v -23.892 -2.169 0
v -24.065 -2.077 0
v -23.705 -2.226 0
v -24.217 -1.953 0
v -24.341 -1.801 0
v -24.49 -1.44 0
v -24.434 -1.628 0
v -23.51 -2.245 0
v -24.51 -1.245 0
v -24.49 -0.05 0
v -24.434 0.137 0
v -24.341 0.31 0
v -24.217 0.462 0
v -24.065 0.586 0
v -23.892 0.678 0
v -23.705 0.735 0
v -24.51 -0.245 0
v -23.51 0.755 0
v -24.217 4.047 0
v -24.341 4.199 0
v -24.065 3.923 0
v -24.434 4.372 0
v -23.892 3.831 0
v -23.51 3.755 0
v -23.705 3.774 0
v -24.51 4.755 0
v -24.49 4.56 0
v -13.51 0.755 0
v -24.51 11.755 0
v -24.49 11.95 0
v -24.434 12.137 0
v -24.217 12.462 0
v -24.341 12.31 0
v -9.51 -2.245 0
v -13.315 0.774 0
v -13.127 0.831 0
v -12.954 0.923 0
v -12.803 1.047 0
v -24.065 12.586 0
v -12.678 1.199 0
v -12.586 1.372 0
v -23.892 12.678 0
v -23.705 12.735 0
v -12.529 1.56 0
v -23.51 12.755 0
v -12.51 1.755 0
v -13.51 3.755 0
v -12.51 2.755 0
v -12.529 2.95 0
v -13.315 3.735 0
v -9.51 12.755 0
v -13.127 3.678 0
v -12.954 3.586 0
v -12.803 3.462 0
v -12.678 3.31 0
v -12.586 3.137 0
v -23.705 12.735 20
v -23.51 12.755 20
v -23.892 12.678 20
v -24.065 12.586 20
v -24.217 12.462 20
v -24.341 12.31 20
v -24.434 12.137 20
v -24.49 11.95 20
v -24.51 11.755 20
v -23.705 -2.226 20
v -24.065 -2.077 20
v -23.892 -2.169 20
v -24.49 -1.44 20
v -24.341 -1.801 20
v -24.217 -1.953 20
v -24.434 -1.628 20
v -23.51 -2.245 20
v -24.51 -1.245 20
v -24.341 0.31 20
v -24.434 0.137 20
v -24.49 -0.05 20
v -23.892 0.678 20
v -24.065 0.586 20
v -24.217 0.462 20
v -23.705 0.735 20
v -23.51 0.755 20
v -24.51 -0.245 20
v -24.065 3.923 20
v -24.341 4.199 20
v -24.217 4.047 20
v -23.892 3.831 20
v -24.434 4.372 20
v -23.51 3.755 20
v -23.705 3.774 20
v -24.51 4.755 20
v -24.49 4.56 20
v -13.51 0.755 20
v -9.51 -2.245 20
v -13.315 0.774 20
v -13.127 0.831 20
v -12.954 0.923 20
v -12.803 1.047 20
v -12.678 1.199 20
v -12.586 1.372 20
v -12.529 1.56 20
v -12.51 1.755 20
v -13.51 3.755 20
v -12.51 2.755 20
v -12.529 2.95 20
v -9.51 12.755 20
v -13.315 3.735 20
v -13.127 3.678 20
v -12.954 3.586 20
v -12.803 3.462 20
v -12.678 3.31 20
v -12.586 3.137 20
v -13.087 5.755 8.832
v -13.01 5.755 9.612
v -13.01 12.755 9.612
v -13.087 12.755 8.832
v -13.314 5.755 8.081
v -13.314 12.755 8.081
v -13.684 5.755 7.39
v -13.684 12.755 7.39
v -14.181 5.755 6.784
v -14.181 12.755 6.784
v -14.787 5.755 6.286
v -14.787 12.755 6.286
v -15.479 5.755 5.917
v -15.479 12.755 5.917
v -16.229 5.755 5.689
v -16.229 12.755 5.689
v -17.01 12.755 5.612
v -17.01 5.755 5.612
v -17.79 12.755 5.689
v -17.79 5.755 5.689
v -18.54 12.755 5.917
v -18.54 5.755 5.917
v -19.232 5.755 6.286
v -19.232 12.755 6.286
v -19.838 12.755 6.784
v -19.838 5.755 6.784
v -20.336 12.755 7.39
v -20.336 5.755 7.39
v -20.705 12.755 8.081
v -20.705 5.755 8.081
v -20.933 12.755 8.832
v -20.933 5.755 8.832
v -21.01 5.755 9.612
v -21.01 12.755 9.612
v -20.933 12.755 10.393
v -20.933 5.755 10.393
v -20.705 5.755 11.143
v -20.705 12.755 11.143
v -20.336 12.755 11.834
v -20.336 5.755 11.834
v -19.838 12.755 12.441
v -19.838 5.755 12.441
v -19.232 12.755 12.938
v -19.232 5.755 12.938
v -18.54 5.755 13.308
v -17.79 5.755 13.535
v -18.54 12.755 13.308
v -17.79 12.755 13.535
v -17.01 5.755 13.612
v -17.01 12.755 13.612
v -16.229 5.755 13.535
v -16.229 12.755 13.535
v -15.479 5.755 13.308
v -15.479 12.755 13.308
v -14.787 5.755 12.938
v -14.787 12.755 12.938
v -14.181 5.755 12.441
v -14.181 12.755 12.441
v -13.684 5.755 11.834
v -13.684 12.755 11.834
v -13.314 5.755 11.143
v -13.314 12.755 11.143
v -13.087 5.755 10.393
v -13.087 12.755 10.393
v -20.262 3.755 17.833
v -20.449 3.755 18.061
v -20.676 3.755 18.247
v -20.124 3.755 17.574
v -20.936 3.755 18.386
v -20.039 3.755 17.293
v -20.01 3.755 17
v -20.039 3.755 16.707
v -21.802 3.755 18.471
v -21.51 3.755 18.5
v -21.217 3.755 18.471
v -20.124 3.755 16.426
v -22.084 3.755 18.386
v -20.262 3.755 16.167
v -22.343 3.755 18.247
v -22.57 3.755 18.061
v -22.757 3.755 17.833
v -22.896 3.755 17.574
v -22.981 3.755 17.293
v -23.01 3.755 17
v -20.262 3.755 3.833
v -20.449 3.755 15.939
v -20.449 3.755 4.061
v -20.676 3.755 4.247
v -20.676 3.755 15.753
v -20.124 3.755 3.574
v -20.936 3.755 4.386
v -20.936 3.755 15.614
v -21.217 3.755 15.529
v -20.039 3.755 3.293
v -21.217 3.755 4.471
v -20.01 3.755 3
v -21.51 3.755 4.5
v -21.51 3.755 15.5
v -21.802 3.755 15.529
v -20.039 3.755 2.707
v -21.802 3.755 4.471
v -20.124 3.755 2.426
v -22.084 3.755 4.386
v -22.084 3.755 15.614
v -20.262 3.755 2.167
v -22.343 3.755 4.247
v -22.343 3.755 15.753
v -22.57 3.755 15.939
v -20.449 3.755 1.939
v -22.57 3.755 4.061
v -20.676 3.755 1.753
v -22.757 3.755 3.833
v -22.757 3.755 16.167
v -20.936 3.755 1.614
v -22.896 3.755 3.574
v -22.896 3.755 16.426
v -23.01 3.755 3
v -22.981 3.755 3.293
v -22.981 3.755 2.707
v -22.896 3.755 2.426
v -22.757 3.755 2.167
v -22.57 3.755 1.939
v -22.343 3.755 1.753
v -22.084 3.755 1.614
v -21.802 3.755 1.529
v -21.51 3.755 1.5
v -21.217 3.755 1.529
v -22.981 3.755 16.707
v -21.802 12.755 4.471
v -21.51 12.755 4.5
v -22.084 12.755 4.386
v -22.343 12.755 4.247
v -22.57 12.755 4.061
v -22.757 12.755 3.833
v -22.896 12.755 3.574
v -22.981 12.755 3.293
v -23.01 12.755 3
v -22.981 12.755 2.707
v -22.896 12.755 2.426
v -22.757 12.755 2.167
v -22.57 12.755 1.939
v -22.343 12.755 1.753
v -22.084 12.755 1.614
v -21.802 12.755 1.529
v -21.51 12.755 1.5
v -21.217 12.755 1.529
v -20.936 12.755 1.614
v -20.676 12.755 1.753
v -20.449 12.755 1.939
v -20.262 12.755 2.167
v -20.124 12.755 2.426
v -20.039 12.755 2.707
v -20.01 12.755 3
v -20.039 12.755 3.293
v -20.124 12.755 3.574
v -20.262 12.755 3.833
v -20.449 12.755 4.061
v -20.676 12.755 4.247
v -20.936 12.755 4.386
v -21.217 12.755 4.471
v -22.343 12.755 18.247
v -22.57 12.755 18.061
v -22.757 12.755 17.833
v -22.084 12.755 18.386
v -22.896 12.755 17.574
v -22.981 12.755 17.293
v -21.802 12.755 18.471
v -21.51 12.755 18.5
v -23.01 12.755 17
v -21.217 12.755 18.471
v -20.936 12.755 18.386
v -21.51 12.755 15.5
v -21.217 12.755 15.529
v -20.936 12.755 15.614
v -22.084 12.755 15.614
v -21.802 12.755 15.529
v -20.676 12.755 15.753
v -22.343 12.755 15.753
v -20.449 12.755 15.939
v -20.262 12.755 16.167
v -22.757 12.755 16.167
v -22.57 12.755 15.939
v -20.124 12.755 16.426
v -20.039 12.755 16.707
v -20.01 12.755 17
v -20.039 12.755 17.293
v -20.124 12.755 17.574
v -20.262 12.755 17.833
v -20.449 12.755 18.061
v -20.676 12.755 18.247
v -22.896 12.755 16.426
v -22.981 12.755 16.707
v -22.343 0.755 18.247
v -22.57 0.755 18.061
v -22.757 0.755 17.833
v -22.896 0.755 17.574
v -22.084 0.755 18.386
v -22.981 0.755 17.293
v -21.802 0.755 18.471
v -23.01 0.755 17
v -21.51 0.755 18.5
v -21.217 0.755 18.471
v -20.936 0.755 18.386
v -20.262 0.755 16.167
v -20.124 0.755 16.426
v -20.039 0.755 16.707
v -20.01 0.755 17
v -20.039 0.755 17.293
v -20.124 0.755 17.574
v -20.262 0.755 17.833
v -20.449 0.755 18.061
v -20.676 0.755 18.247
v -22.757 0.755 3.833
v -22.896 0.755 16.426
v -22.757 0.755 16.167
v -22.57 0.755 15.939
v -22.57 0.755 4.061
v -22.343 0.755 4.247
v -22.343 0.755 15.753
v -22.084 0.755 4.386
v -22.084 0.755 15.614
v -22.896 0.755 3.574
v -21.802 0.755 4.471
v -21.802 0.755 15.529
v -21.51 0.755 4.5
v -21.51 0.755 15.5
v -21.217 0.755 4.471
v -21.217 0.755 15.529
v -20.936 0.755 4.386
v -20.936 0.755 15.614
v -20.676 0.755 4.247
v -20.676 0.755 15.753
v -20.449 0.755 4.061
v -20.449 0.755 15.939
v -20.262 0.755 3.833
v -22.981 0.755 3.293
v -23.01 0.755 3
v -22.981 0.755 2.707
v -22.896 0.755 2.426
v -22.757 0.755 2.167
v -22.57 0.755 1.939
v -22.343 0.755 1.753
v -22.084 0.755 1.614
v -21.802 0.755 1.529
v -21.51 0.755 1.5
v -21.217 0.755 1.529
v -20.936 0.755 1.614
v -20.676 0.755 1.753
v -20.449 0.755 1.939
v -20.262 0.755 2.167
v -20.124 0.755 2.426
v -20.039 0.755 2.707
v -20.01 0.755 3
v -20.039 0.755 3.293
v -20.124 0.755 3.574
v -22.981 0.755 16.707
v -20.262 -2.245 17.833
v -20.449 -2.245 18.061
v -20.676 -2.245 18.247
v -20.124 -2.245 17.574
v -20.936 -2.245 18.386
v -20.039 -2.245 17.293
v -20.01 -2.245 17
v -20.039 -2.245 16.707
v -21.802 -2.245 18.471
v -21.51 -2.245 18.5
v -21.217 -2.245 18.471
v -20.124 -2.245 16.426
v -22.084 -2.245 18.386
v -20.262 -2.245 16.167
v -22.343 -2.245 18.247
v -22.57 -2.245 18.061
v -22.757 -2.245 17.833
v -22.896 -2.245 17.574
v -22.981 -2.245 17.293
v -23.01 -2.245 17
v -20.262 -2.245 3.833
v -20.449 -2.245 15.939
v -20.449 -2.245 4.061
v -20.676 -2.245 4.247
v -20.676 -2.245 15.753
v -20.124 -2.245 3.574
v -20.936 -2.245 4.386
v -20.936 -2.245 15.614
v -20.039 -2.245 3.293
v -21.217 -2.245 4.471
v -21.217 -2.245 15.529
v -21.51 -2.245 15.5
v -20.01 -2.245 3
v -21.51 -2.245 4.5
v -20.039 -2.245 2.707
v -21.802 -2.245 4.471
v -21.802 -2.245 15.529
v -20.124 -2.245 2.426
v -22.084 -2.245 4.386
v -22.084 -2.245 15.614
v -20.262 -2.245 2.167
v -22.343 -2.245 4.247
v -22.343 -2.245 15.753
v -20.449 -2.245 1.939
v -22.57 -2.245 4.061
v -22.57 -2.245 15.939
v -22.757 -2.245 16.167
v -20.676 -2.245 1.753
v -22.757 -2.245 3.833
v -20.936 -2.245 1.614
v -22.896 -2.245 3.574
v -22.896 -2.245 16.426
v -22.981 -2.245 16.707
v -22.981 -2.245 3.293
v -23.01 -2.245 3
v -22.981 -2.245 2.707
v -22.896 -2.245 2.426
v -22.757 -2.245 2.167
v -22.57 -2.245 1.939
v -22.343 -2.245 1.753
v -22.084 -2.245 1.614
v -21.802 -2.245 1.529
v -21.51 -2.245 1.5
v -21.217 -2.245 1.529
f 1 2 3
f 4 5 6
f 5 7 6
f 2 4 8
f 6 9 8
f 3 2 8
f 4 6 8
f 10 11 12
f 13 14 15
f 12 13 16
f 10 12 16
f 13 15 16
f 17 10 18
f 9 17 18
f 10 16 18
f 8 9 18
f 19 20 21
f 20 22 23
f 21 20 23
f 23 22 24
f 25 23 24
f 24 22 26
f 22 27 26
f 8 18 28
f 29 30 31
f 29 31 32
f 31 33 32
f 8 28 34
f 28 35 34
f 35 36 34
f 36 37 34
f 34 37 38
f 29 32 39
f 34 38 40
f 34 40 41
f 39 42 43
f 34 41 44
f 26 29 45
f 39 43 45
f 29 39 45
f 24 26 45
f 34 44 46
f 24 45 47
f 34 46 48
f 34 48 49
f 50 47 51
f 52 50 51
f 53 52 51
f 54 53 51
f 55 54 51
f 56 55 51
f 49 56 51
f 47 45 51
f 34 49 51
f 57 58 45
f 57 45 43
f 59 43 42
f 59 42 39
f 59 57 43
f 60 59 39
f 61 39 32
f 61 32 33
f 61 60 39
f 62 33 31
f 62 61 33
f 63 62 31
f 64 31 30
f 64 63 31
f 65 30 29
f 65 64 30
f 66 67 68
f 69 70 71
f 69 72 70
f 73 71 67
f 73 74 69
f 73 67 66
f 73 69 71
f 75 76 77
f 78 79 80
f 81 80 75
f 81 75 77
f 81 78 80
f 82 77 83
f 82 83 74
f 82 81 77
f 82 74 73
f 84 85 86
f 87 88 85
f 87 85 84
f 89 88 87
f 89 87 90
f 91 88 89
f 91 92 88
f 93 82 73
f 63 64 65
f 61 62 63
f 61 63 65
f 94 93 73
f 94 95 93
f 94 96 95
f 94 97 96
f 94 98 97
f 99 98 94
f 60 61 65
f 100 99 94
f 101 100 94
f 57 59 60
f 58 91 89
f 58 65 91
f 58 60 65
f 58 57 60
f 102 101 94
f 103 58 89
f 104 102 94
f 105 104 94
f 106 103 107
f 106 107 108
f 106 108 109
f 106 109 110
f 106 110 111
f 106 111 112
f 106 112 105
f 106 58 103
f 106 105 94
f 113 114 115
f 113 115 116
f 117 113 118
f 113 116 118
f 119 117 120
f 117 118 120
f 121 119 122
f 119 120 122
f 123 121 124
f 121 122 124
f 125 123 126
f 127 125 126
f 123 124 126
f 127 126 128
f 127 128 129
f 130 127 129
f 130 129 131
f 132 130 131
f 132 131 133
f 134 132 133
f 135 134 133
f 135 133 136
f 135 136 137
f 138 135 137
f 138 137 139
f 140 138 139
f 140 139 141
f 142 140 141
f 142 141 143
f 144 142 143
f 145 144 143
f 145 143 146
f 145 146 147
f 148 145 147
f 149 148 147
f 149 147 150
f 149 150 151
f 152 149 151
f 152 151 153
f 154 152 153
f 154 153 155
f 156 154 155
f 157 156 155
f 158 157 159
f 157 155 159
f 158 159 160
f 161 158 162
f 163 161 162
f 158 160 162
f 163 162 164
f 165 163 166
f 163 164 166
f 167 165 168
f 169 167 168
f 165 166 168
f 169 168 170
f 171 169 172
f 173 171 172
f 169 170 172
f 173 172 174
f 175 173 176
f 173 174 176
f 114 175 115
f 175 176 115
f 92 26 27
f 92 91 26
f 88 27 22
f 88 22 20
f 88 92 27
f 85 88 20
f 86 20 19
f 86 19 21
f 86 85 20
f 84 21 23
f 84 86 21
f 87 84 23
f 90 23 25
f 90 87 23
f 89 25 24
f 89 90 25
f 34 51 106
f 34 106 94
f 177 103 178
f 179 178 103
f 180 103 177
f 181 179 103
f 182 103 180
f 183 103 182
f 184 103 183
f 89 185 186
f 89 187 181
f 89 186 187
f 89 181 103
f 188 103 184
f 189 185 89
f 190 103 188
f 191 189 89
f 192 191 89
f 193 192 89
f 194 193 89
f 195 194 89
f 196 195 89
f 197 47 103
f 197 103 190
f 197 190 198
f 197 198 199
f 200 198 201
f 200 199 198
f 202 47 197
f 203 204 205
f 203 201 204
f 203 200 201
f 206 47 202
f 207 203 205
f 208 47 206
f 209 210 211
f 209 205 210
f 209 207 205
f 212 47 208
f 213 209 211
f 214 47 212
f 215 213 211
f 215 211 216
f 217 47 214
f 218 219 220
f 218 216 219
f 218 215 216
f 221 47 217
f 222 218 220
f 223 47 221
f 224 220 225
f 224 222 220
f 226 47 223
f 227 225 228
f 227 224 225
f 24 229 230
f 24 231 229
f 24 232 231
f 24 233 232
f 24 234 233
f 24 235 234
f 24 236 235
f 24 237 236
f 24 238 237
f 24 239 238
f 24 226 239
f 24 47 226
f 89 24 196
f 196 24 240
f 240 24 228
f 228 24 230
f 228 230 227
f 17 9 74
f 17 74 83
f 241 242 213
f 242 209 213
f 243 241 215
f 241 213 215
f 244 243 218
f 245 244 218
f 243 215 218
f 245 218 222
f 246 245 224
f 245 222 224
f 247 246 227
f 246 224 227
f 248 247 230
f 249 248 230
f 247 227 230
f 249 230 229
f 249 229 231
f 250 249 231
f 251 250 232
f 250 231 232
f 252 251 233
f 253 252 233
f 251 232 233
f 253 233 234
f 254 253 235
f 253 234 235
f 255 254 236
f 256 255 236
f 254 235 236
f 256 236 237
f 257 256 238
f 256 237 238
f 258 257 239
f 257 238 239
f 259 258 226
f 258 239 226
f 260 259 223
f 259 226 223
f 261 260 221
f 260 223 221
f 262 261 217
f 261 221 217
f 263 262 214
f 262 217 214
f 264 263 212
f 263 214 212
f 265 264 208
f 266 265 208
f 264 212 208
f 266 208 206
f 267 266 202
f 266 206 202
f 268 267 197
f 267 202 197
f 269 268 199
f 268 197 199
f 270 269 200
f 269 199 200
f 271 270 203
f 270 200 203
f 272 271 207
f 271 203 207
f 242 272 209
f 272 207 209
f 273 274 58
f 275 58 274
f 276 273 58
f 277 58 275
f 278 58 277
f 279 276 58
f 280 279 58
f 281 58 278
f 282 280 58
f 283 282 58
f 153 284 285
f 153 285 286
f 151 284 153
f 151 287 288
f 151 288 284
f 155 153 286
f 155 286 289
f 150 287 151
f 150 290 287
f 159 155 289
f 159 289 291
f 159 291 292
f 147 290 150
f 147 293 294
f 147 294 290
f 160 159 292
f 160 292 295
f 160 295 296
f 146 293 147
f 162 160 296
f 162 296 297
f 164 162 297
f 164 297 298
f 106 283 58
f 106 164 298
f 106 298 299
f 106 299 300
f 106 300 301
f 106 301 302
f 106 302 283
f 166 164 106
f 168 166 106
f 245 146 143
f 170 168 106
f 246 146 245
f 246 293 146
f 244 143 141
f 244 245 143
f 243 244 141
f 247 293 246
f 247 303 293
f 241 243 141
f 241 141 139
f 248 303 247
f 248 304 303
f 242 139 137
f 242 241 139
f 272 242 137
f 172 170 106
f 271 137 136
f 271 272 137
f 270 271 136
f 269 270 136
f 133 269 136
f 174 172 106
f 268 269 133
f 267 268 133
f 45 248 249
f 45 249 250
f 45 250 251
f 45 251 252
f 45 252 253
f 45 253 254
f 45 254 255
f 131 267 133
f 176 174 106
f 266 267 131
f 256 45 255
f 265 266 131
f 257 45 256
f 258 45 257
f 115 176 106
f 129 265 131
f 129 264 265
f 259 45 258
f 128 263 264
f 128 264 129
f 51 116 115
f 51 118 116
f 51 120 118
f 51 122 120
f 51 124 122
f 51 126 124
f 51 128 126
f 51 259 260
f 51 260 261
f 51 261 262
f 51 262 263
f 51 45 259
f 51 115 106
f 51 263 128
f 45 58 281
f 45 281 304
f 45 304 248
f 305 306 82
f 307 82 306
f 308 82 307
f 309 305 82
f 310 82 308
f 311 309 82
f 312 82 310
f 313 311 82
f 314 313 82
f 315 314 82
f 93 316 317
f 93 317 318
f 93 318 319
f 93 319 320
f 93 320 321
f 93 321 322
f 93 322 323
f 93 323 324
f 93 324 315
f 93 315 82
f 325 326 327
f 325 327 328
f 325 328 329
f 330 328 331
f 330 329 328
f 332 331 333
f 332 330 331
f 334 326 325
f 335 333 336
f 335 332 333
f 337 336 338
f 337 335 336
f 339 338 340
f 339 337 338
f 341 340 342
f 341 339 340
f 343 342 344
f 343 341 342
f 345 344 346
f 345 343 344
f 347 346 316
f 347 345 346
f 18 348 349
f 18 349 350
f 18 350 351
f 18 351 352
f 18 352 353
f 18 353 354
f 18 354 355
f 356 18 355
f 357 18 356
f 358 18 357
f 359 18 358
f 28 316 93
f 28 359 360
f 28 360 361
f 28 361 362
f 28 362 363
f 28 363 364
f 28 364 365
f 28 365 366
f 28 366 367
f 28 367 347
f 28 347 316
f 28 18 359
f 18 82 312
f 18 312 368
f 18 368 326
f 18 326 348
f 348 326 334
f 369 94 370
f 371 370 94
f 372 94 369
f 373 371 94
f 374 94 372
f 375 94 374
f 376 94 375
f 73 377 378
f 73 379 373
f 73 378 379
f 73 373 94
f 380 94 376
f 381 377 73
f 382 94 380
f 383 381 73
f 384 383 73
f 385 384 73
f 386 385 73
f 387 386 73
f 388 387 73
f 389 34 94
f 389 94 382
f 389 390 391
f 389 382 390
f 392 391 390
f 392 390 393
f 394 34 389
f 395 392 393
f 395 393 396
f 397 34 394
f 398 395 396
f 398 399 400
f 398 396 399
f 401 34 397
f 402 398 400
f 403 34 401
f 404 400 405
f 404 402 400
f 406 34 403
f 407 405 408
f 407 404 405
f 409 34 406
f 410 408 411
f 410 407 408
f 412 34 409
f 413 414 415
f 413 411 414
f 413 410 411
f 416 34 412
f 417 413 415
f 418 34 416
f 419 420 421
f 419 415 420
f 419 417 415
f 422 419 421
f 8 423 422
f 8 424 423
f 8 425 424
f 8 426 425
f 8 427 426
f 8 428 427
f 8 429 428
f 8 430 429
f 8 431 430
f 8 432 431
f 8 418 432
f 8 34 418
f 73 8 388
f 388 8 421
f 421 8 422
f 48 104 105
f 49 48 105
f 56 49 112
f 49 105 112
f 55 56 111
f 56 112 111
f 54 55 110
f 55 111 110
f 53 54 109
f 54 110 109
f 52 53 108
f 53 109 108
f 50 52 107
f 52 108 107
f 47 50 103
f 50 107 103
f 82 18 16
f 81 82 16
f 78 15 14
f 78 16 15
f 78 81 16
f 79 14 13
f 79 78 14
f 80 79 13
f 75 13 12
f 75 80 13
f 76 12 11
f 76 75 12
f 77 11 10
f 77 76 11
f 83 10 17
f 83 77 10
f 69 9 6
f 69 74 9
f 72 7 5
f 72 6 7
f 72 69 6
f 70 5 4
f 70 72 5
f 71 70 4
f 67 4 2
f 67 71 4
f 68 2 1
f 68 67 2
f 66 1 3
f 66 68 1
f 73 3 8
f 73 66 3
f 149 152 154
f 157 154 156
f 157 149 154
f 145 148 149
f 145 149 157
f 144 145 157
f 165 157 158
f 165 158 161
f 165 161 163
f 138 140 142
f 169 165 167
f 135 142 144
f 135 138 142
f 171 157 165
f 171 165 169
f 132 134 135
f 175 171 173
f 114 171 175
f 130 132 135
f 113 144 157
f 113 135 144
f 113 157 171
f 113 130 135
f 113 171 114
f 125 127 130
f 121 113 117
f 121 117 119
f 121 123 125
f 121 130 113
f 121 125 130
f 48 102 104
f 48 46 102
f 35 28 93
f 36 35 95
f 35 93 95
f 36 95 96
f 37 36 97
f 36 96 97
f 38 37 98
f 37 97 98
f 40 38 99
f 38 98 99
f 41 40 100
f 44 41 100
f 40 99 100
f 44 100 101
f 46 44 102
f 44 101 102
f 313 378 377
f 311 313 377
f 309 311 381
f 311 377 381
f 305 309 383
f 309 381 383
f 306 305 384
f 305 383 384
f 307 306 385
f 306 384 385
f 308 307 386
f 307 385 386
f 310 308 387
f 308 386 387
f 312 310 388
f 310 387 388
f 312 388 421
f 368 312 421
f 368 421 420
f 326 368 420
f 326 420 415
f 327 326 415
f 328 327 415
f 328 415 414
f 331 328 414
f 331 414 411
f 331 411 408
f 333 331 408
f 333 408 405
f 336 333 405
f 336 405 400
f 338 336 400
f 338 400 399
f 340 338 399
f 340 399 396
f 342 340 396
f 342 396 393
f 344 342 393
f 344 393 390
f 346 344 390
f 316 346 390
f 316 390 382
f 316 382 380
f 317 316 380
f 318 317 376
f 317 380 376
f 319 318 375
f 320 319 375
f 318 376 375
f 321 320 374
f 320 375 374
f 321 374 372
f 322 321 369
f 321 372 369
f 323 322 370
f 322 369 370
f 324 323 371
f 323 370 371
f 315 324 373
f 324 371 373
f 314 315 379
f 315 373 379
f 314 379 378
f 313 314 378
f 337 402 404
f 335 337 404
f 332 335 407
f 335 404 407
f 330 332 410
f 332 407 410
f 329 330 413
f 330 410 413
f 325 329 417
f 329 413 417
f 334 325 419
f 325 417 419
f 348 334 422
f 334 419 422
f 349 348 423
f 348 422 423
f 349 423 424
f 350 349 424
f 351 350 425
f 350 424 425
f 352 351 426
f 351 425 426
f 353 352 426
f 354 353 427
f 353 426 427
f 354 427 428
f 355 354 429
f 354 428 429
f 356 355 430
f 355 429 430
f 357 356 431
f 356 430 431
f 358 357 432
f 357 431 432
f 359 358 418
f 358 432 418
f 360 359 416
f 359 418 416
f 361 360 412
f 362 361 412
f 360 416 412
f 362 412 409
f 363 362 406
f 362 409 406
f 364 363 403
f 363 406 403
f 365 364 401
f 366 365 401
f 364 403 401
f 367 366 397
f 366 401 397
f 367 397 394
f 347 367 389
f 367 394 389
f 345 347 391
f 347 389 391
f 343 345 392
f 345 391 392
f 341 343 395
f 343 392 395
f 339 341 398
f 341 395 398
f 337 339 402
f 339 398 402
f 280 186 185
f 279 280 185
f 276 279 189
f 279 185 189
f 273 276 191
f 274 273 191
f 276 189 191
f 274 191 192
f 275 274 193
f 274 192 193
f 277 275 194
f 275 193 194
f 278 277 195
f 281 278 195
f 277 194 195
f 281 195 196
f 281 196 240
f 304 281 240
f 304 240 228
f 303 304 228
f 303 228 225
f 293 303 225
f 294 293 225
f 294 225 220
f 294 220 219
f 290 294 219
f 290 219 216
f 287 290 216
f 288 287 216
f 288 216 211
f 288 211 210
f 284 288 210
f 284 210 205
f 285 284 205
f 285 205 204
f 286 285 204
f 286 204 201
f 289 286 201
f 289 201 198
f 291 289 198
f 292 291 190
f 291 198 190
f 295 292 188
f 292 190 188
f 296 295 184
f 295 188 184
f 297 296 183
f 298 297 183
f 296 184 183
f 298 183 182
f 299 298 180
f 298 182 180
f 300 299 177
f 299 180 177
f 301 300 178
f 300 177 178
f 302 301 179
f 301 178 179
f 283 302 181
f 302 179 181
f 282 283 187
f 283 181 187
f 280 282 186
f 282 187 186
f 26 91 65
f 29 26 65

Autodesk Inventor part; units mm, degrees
ref_plane "YZ Plane" through (0, 0, 0) normal (1, 0, 0) x (0, 1, 0)
ref_plane "XZ Plane" through (0, 0, 0) normal (0, 1, 0) x (-1, 0, 0)
ref_plane "XY Plane" through (0, 0, 0) normal (0, 0, 1) x (1, 0, 0)
sketch "Esquisse1" plane through (0, 0, 0) normal (0, 0, 1) x (1, 0, 0)
  line L0 (-24.5097, 12.7546) -> (-9.5097, 12.7546)
  line L1 (-9.5097, 12.7546) -> (-9.5097, -2.2454)
  line L2 (-9.5097, -2.2454) -> (-24.5097, -2.2454)
  line L3 (-24.5097, -2.2454) -> (-24.5097, 0.7546)
  line L4 (-24.5097, 0.7546) -> (-12.5097, 0.7546)
  line L5 (-12.5097, 0.7546) -> (-12.5097, 3.7546)
  line L6 (-12.5097, 3.7546) -> (-24.5097, 3.7546)
  line L7 (-24.5097, 3.7546) -> (-24.5097, 12.7546)
  dimension "d0" = 15
  dimension "d1" = 15
  dimension "d2" = 3
  dimension "d3" = 9
  dimension "d4" = 12
extrude "Extrusion1" add sketch "Esquisse1" along normal blind 20
sketch "Esquisse2" plane through (-24.5097, 12.7546, 0) normal (0, 1, 0) x (1, 0, 0)
  circle A0 centre (3, -3) radius 1.5
  circle A1 centre (3, -17) radius 1.5
  line L0 (0, 0) -> (0, -20) projected
  line L1 (15, 0) -> (0, 0) projected
  line L2 (15, -20) -> (0, -20) projected
  point P0 (24.5097, 0)
  dimension "d8" = 3
  dimension "d9" = 3
  dimension "d13" = 3
  dimension "d15" = 3
  dimension "d30" = 3
  dimension "d31" = 3
hole "Perçage1" at (-21.5097, 12.7546, 3) at (-21.5097, 12.7546, 17) direction (0, -1, 0) diameter 3 end through all
sketch "Esquisse3" plane through (-24.5097, 12.7546, 0) normal (0, 1, 0) x (1, 0, 0)
  circle A0 centre (7.5, -9.6122) radius 4
  line L0 (15, 0) -> (15, -20) projected
  point P0 (24.5097, 0)
  dimension "d26" = 8
  dimension "d27" = 7.5
extrude "Extrusion2" cut sketch "Esquisse3" against normal blind 7
fillet "Congé1" radius 1 6 edges at (-12.5097, 3.7546, 10) (-12.5097, 0.7546, 10) (-24.5097, -2.2454, 10) (-24.5097, 0.7546, 10) (-24.5097, 3.7546, 10) (-24.5097, 12.7546, 10)
properties part number "support tige voiture"
